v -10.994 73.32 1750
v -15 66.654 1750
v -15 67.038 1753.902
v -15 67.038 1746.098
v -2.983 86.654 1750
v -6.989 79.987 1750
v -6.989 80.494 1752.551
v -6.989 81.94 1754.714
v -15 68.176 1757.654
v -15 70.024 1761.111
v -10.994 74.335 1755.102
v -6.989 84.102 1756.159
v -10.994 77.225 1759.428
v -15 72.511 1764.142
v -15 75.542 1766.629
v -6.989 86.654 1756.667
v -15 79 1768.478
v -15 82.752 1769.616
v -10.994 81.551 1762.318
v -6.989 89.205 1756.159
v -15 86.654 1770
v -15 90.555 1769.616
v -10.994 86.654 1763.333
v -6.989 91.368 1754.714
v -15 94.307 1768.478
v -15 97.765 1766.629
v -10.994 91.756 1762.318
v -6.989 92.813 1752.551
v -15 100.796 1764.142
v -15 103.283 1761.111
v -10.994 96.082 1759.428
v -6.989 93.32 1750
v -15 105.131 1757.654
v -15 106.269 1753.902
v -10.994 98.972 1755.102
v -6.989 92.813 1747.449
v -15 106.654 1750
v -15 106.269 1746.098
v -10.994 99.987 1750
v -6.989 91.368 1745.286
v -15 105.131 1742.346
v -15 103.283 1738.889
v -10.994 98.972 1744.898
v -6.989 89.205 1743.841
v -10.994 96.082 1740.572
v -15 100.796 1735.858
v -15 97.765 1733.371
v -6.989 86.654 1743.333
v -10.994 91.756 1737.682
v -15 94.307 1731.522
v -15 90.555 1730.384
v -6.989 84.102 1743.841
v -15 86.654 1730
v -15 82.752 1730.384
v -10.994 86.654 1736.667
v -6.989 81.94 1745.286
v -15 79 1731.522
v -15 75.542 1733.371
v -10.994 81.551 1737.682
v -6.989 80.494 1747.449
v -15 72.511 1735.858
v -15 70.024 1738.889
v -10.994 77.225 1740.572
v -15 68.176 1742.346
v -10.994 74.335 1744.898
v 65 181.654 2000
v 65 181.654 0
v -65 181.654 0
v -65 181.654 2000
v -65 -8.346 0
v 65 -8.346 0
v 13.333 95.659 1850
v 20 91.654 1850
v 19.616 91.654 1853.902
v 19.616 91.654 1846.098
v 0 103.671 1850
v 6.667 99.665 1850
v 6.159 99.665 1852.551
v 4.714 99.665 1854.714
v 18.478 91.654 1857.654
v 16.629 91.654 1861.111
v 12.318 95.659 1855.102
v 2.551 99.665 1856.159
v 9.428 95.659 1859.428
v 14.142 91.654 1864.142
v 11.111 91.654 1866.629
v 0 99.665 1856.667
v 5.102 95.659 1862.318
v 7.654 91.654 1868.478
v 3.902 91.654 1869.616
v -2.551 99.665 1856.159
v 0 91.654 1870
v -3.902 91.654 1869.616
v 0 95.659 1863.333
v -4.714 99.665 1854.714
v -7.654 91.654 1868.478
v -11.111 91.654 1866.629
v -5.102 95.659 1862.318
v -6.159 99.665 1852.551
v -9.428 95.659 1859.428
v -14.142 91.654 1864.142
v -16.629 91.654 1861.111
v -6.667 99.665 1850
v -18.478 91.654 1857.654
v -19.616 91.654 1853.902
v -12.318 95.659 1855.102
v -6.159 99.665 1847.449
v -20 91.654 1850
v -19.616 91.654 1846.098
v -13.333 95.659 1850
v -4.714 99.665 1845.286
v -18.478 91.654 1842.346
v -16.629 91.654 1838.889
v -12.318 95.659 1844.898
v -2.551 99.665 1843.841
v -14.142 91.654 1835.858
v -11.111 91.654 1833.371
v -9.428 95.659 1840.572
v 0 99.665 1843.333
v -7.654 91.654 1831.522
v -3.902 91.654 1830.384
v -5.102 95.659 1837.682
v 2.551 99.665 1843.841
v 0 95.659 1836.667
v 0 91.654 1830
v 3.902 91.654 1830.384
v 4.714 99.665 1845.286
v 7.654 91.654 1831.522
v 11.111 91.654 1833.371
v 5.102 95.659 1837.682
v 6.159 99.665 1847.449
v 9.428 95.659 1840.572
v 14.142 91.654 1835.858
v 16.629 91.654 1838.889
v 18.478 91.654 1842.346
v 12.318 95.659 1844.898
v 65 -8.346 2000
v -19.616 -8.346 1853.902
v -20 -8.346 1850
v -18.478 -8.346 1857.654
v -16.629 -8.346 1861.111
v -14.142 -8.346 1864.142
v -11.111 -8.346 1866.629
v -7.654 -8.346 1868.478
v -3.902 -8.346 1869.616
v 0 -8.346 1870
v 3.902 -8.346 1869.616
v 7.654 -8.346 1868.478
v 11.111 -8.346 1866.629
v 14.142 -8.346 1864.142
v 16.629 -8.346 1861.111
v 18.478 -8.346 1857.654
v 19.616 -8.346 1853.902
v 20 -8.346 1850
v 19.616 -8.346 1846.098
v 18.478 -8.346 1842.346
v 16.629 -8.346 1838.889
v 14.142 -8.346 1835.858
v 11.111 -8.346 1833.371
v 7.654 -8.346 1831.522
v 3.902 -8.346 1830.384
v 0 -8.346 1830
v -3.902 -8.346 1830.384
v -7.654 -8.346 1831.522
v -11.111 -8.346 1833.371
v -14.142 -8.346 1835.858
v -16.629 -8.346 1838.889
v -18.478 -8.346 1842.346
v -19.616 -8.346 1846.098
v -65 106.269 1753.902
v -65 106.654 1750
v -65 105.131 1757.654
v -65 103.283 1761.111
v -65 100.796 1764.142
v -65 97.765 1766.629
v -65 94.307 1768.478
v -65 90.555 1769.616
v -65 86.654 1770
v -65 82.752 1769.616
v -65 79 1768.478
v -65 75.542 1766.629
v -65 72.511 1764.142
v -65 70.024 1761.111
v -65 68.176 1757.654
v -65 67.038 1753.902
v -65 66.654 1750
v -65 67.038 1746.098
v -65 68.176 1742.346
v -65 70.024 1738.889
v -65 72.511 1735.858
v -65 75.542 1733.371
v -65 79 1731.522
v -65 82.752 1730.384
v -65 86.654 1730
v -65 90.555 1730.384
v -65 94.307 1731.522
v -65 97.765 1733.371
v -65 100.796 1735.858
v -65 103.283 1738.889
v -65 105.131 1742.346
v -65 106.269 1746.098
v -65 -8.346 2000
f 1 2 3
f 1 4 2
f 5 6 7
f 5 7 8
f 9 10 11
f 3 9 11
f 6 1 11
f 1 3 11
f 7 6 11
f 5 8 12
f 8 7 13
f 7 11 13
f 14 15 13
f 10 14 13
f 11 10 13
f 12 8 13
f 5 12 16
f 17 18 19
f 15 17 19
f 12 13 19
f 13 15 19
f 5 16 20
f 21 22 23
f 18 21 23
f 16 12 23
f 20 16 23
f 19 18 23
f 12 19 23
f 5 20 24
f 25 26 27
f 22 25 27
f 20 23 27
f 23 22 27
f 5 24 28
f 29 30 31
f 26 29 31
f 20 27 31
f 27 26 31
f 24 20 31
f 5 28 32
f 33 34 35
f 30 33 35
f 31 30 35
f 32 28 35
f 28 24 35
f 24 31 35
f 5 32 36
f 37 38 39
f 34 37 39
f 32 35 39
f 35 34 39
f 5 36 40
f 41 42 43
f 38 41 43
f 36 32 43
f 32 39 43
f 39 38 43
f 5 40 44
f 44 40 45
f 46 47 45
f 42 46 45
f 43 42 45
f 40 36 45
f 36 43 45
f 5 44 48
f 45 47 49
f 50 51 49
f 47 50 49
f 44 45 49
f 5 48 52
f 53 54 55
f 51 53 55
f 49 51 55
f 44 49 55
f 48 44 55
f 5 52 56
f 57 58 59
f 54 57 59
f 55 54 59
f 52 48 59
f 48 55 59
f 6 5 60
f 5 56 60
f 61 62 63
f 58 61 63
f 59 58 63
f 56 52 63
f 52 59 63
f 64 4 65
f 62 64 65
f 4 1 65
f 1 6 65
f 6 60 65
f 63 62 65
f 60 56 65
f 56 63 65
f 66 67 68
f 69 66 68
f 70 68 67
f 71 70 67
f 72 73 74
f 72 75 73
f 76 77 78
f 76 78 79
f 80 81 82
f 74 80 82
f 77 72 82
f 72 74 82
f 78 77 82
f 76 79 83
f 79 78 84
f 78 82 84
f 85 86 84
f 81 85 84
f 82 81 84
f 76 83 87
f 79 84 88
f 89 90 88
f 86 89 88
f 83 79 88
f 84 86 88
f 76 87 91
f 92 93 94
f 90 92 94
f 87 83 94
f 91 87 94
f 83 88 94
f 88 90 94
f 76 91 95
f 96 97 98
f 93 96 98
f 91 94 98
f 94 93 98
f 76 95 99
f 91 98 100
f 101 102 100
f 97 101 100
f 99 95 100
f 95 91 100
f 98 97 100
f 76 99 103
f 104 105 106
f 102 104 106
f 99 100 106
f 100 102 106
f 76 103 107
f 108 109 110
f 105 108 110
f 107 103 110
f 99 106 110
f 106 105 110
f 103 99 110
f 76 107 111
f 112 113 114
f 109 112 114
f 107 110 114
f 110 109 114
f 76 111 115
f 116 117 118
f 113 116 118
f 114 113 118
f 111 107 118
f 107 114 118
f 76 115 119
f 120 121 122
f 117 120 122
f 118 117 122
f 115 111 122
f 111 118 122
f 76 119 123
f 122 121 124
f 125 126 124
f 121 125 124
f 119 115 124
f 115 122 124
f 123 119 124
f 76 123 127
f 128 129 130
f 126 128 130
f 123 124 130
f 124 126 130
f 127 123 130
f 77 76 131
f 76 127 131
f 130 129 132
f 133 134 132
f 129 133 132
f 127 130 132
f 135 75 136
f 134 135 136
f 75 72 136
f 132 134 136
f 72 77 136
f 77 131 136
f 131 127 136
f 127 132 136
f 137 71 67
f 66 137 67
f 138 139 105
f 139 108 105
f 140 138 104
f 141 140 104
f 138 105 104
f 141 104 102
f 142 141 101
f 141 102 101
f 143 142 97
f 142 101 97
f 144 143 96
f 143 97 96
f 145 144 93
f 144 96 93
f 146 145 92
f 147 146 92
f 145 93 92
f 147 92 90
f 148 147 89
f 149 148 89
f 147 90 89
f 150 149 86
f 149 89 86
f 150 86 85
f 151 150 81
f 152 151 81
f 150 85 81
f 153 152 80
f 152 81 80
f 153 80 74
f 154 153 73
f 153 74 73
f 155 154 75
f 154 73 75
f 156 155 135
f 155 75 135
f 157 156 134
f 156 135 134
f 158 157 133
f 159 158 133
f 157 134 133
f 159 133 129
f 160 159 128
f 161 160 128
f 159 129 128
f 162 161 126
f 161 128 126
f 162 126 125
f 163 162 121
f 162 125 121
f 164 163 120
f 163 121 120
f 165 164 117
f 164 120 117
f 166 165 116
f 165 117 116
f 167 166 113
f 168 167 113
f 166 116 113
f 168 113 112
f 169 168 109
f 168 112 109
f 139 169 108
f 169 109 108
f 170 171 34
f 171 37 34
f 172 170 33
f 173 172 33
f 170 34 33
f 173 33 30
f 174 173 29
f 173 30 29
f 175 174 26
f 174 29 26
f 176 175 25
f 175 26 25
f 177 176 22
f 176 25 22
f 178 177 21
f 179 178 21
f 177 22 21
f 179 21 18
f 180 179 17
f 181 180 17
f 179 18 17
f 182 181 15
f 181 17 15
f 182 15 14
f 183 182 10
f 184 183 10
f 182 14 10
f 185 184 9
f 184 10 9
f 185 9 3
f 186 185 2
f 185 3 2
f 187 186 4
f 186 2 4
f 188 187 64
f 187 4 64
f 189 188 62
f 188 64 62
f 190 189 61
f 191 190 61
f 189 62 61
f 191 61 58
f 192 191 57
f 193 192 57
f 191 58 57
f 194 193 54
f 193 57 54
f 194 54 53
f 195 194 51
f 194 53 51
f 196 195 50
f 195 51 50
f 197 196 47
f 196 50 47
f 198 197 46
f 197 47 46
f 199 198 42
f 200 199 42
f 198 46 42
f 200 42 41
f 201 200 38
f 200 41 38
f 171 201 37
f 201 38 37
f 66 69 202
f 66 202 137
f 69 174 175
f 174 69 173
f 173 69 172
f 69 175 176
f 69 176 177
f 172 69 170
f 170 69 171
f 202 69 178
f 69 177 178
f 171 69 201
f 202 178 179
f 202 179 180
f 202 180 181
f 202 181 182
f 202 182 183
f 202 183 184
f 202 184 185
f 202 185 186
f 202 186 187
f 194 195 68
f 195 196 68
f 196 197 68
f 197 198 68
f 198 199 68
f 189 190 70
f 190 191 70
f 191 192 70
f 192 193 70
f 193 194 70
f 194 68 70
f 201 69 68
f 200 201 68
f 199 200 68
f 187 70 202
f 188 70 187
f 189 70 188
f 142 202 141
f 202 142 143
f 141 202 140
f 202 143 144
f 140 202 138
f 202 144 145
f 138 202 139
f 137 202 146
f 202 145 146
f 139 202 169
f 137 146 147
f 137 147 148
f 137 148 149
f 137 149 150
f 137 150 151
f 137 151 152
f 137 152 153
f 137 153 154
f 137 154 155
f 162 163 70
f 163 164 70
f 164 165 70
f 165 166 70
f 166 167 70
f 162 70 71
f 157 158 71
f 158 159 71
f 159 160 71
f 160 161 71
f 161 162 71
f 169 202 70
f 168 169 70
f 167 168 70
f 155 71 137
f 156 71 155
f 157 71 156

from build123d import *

# Parameters (mm, degrees)
F1_DEPTH = 2000
F3_D     = 40
F3_DEPTH = 100
F3_TIP   = 12.0172123806
F5_D     = 40
F5_DEPTH = 50
F5_TIP   = 12.0172123806


with BuildPart() as f1:
    # F0 (on Top) → F1 (new body)
    with BuildSketch(Plane.XY):
        Polygon((-34.2555230263, 181.6535690603), (-65, 181.6535690603), (-65, -8.3464309397), (65, -8.3464309397), (65, 181.6535690603), (34.2555230263, 181.6535690603), align=None)
    extrude(amount=F1_DEPTH)

    # F3
    with Locations(Plane.XZ.offset(8.3464309397)):
        with Locations((0, 1850)):
            Hole(F3_D / 2, depth=F3_DEPTH)
            with Locations((0, 0, -(F3_DEPTH + F3_TIP / 2))):  # 118° drill point
                Cone(0, F3_D / 2, F3_TIP, mode=Mode.SUBTRACT)

    # F5
    with Locations(Plane(origin=(-65, 0, 0), x_dir=(0, -1, 0), z_dir=(-1, 0, 0))):
        with Locations((-86.6535690603, 1750)):
            Hole(F5_D / 2, depth=F5_DEPTH)
            with Locations((0, 0, -(F5_DEPTH + F5_TIP / 2))):  # 118° drill point
                Cone(0, F5_D / 2, F5_TIP, mode=Mode.SUBTRACT)


solid = f1.part
